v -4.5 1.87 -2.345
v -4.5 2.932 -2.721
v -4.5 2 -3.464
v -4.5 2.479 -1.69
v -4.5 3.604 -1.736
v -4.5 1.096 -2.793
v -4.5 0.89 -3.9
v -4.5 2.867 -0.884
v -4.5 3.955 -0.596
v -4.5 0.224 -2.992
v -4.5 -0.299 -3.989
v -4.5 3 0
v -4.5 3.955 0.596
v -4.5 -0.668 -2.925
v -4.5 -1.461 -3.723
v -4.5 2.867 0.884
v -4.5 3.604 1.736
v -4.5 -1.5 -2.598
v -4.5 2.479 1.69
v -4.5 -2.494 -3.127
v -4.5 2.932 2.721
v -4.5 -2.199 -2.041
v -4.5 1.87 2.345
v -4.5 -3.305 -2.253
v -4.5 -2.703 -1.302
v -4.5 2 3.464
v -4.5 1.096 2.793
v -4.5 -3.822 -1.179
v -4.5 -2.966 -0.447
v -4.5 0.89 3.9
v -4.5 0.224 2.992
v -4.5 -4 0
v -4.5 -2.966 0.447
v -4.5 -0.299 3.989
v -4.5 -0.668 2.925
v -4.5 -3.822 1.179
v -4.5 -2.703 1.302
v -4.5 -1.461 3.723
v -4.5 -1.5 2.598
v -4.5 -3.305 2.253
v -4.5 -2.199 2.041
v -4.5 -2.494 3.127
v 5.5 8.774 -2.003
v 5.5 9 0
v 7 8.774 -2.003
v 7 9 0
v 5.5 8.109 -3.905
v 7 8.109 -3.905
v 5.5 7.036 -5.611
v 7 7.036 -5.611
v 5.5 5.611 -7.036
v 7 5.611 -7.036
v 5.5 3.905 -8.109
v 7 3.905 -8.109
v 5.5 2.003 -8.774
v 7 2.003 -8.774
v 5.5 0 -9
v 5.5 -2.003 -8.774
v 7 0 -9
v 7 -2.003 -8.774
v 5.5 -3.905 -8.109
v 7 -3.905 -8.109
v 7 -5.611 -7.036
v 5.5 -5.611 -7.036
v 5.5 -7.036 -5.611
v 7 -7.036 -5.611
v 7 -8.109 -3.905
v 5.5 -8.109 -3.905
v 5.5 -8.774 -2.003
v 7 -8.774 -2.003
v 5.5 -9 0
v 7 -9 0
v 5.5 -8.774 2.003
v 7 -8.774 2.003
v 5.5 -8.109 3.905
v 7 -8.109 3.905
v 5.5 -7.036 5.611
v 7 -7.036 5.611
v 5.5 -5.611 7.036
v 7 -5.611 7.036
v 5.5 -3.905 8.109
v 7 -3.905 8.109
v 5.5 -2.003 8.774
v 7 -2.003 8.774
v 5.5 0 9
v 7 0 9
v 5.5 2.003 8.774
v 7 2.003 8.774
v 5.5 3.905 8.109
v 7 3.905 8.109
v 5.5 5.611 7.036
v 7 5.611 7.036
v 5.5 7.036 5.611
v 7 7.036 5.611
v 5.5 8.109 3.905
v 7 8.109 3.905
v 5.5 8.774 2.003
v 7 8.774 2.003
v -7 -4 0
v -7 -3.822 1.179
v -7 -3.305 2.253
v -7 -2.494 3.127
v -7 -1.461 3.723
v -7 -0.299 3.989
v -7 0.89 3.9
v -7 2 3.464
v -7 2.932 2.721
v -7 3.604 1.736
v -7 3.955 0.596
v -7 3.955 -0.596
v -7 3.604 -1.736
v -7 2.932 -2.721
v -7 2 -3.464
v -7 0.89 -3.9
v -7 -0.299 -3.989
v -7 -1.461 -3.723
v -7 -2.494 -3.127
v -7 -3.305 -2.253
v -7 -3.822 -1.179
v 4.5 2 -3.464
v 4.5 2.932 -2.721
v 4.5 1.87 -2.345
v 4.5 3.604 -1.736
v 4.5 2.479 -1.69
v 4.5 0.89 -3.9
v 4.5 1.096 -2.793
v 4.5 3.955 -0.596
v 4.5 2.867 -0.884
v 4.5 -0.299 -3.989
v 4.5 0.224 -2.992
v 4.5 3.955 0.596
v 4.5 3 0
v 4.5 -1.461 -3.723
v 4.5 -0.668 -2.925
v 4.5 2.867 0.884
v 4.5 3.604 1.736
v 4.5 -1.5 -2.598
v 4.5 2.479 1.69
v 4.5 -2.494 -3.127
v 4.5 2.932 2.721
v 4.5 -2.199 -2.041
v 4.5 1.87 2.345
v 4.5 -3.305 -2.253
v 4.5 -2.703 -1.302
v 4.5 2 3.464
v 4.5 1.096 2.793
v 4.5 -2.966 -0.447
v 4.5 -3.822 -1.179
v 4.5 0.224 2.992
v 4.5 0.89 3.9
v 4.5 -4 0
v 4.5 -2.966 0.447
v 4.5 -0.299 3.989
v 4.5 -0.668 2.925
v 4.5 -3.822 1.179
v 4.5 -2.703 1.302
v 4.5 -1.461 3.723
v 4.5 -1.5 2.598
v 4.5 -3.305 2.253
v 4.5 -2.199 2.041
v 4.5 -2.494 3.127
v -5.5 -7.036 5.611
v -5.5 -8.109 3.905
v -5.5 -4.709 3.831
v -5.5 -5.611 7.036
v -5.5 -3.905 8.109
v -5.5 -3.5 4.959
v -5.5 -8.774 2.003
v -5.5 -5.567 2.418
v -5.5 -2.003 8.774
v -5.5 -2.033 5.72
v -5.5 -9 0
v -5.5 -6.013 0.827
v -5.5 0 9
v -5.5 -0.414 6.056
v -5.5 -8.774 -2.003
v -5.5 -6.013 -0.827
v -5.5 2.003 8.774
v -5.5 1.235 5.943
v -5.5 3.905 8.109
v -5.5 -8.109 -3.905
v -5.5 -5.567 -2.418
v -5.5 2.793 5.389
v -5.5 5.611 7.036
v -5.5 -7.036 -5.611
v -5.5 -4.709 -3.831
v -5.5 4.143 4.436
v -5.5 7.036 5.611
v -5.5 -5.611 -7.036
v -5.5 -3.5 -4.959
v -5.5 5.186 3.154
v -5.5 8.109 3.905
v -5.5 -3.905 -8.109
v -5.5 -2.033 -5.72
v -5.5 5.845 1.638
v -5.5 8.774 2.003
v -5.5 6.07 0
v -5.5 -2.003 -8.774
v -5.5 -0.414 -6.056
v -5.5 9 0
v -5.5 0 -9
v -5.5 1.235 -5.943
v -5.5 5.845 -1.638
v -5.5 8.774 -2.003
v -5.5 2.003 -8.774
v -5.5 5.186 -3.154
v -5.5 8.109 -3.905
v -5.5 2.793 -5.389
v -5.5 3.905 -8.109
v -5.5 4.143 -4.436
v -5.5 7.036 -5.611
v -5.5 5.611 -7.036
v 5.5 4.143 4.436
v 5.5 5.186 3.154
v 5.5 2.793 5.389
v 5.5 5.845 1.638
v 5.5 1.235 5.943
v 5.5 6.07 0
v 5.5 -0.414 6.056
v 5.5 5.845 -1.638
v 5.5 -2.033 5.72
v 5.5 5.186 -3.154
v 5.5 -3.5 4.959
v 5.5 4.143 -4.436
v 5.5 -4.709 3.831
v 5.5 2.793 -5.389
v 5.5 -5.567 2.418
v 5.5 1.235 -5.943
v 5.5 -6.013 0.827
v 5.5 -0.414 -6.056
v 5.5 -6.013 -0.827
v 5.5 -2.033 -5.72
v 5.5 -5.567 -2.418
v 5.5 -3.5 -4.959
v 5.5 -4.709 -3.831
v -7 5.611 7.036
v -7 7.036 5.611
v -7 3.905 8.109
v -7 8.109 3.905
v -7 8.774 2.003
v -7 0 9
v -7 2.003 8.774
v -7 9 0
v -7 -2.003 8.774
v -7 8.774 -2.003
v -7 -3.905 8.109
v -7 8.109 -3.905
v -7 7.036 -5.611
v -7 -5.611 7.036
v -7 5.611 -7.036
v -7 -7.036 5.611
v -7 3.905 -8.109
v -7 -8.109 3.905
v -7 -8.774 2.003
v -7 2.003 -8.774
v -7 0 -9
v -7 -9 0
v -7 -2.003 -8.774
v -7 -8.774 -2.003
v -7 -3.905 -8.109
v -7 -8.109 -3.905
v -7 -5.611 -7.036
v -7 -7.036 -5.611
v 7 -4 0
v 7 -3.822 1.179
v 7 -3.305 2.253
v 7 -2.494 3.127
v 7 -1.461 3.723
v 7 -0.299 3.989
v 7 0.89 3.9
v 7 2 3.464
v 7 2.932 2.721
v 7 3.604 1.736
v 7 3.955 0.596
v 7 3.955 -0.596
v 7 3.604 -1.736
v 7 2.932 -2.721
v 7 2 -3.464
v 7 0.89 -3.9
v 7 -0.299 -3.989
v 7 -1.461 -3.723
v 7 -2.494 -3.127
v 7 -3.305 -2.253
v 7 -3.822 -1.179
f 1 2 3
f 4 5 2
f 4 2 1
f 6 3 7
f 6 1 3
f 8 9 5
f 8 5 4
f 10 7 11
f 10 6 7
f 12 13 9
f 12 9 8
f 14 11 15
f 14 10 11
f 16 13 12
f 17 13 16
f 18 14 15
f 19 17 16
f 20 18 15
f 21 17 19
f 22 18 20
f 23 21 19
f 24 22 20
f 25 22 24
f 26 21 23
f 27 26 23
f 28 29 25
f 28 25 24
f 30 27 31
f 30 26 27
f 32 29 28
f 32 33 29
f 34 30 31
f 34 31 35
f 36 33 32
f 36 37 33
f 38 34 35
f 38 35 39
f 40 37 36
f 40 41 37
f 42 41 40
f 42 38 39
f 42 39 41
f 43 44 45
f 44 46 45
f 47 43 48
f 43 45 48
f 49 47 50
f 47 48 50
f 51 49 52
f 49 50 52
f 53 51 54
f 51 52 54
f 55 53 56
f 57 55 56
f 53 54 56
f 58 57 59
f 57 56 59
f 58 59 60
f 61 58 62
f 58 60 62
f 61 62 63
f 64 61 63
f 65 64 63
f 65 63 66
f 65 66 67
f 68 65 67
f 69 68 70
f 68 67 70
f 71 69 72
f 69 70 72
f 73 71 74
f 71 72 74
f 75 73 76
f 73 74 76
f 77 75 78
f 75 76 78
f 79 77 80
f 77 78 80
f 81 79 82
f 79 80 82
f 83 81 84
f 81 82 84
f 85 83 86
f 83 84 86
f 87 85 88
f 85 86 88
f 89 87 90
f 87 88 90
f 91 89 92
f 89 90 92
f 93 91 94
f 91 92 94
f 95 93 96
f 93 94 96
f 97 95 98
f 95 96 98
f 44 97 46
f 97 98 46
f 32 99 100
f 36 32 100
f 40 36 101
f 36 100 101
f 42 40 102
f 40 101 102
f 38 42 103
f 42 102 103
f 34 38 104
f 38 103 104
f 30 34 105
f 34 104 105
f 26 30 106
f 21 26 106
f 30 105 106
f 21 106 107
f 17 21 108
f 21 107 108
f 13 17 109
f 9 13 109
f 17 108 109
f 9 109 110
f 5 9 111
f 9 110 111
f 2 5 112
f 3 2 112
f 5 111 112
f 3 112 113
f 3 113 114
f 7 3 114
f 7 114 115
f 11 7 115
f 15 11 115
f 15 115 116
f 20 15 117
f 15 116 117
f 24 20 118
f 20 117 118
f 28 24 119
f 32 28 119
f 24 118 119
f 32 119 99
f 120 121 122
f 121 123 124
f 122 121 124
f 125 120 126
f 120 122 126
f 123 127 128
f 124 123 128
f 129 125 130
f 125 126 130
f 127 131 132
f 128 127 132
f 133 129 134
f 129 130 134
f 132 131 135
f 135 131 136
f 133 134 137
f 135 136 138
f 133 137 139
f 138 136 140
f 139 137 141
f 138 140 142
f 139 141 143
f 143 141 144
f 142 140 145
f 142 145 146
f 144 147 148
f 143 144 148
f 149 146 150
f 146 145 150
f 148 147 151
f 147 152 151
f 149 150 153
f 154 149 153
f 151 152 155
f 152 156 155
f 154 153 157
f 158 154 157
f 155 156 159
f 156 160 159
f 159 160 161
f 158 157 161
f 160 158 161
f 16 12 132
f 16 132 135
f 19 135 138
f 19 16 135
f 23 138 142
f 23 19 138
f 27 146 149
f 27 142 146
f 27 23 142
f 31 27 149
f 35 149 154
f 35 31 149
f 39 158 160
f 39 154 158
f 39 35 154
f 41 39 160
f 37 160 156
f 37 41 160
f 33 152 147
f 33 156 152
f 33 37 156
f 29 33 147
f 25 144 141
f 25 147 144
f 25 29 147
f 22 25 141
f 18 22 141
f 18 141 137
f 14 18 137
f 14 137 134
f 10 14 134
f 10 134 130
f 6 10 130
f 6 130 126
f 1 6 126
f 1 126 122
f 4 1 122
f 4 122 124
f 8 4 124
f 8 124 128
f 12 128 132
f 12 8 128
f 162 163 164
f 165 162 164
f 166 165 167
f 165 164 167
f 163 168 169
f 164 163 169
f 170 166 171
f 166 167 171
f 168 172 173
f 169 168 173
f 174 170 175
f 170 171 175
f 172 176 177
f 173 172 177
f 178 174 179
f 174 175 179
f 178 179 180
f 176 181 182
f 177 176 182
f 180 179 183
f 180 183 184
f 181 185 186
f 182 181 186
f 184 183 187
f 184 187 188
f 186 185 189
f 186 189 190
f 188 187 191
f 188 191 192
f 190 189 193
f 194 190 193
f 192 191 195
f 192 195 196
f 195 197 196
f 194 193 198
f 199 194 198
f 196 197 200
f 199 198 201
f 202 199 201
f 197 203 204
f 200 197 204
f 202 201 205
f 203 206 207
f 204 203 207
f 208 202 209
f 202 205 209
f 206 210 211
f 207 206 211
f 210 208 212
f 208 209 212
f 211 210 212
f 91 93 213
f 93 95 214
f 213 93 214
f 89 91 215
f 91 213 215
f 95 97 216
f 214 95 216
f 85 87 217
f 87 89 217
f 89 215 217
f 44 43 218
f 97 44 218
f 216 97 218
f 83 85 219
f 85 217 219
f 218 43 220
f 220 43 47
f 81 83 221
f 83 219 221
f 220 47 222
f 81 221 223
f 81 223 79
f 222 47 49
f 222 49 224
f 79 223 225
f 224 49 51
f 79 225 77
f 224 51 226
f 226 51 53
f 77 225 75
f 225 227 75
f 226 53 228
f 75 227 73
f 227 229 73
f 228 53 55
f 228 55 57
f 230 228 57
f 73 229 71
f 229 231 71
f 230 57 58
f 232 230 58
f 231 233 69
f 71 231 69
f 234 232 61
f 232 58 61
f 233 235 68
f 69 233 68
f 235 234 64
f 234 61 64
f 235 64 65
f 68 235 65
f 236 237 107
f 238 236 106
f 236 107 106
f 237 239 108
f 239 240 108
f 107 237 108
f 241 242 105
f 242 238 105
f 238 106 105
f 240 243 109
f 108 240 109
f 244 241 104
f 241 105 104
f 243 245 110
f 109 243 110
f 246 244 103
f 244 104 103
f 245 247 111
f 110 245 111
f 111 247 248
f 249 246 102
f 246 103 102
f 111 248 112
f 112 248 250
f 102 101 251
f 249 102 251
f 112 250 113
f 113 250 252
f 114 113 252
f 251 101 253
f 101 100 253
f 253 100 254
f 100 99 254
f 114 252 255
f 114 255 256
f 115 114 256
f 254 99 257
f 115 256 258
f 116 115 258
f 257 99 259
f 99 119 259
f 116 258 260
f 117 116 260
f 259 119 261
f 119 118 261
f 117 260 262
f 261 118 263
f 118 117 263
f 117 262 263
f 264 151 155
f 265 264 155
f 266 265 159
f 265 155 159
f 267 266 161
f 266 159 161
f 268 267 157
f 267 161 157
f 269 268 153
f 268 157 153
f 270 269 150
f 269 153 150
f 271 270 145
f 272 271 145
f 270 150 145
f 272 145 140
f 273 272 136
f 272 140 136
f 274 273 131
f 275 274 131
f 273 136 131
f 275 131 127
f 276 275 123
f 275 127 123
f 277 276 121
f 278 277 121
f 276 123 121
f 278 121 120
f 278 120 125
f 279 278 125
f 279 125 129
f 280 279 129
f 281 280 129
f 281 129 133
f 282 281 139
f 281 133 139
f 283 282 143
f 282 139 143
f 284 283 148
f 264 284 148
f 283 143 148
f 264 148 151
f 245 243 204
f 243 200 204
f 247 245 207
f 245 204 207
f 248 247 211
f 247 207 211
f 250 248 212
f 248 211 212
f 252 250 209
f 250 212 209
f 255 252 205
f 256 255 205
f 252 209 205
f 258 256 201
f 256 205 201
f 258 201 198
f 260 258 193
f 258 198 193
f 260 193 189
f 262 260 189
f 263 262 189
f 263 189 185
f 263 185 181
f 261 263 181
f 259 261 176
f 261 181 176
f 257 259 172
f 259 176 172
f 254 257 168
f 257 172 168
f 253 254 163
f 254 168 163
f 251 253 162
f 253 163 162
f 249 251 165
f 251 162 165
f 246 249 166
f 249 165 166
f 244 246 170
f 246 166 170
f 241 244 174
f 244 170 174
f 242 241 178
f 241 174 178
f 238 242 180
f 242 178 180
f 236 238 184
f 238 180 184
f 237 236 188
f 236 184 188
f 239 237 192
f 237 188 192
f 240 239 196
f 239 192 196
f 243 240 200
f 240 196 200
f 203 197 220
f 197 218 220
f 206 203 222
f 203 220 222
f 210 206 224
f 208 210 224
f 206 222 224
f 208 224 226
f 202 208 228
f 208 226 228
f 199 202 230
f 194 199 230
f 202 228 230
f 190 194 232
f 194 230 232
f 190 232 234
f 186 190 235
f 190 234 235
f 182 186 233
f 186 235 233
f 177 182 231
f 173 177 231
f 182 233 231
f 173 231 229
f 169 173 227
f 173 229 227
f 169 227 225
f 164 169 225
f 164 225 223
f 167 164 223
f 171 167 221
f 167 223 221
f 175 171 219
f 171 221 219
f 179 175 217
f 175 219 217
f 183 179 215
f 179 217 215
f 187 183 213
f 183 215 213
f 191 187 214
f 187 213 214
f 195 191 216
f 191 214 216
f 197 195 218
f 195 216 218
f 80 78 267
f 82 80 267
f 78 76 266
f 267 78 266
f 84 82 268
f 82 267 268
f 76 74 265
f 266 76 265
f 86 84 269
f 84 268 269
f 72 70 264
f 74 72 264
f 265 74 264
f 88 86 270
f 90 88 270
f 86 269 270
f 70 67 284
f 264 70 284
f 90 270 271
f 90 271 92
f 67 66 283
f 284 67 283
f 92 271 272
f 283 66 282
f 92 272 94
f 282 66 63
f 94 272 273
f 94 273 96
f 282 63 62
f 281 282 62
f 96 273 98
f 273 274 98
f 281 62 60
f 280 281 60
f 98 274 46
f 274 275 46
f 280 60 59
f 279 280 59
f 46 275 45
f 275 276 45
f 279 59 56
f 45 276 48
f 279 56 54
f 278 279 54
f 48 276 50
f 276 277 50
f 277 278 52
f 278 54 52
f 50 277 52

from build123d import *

# Parameters (mm, degrees)
CUT_EXTRUDE2_DEPTH      = 19.920887928
CUT_EXTRUDE2_DEPTH_BACK = 19.920887928
SKETCH3_R               = 3
SKETCH2_R               = 4
CUT_EXTRUDE1_DEPTH      = 2.5
CUT_EXTRUDE4_START      = 2.5
SKETCH4_R               = 4
CUT_EXTRUDE4_DEPTH      = 2.5


with BuildPart() as part:
    # Sketch1 → Revolve1 (revolve)
    with BuildSketch(Plane.XY):
        Polygon((-7, 0), (-7, 9), (-5.5, 9), (-5.5, 6.07), (5.5, 6.07), (5.5, 9), (7, 9), (7, 0), align=None)
    revolve(axis=Axis((7, 0, 0), (-1, 0, 0)))

    # Sketch3 → Cut-Extrude2 (cut, two sides: drawn at the far end of the back side and taken through both)
    with BuildSketch(Plane(origin=(7, 0, 0), x_dir=(0, 0, -1), z_dir=(1, 0, 0)).offset(-CUT_EXTRUDE2_DEPTH_BACK)):
        with Locations(Location((0, 0, 0), (0, 0, 90))):
            Circle(SKETCH3_R)
    extrude(amount=CUT_EXTRUDE2_DEPTH + CUT_EXTRUDE2_DEPTH_BACK, mode=Mode.SUBTRACT)

    # Sketch2 → Cut-Extrude1 (cut)
    with BuildSketch(Plane(origin=(-7, 0, 18.209055513), x_dir=(0, 0, 1), z_dir=(-1, 0, 0))):
        with Locations(Location((-18.209055513, 0, 0), (0, 0, 270))):
            Circle(SKETCH2_R)
    extrude(amount=-CUT_EXTRUDE1_DEPTH, mode=Mode.SUBTRACT)

    # Sketch4 → Cut-Extrude4 (cut)
    with BuildSketch(Plane(origin=(7, 0, 11.209055513), x_dir=(0, 0, 1), z_dir=(-1, 0, 0)).offset(CUT_EXTRUDE4_START)):
        with Locations(Location((-11.209055513, 0, 0), (0, 0, 270))):
            Circle(SKETCH4_R)
    extrude(amount=-CUT_EXTRUDE4_DEPTH, mode=Mode.SUBTRACT)


solid = part.part
